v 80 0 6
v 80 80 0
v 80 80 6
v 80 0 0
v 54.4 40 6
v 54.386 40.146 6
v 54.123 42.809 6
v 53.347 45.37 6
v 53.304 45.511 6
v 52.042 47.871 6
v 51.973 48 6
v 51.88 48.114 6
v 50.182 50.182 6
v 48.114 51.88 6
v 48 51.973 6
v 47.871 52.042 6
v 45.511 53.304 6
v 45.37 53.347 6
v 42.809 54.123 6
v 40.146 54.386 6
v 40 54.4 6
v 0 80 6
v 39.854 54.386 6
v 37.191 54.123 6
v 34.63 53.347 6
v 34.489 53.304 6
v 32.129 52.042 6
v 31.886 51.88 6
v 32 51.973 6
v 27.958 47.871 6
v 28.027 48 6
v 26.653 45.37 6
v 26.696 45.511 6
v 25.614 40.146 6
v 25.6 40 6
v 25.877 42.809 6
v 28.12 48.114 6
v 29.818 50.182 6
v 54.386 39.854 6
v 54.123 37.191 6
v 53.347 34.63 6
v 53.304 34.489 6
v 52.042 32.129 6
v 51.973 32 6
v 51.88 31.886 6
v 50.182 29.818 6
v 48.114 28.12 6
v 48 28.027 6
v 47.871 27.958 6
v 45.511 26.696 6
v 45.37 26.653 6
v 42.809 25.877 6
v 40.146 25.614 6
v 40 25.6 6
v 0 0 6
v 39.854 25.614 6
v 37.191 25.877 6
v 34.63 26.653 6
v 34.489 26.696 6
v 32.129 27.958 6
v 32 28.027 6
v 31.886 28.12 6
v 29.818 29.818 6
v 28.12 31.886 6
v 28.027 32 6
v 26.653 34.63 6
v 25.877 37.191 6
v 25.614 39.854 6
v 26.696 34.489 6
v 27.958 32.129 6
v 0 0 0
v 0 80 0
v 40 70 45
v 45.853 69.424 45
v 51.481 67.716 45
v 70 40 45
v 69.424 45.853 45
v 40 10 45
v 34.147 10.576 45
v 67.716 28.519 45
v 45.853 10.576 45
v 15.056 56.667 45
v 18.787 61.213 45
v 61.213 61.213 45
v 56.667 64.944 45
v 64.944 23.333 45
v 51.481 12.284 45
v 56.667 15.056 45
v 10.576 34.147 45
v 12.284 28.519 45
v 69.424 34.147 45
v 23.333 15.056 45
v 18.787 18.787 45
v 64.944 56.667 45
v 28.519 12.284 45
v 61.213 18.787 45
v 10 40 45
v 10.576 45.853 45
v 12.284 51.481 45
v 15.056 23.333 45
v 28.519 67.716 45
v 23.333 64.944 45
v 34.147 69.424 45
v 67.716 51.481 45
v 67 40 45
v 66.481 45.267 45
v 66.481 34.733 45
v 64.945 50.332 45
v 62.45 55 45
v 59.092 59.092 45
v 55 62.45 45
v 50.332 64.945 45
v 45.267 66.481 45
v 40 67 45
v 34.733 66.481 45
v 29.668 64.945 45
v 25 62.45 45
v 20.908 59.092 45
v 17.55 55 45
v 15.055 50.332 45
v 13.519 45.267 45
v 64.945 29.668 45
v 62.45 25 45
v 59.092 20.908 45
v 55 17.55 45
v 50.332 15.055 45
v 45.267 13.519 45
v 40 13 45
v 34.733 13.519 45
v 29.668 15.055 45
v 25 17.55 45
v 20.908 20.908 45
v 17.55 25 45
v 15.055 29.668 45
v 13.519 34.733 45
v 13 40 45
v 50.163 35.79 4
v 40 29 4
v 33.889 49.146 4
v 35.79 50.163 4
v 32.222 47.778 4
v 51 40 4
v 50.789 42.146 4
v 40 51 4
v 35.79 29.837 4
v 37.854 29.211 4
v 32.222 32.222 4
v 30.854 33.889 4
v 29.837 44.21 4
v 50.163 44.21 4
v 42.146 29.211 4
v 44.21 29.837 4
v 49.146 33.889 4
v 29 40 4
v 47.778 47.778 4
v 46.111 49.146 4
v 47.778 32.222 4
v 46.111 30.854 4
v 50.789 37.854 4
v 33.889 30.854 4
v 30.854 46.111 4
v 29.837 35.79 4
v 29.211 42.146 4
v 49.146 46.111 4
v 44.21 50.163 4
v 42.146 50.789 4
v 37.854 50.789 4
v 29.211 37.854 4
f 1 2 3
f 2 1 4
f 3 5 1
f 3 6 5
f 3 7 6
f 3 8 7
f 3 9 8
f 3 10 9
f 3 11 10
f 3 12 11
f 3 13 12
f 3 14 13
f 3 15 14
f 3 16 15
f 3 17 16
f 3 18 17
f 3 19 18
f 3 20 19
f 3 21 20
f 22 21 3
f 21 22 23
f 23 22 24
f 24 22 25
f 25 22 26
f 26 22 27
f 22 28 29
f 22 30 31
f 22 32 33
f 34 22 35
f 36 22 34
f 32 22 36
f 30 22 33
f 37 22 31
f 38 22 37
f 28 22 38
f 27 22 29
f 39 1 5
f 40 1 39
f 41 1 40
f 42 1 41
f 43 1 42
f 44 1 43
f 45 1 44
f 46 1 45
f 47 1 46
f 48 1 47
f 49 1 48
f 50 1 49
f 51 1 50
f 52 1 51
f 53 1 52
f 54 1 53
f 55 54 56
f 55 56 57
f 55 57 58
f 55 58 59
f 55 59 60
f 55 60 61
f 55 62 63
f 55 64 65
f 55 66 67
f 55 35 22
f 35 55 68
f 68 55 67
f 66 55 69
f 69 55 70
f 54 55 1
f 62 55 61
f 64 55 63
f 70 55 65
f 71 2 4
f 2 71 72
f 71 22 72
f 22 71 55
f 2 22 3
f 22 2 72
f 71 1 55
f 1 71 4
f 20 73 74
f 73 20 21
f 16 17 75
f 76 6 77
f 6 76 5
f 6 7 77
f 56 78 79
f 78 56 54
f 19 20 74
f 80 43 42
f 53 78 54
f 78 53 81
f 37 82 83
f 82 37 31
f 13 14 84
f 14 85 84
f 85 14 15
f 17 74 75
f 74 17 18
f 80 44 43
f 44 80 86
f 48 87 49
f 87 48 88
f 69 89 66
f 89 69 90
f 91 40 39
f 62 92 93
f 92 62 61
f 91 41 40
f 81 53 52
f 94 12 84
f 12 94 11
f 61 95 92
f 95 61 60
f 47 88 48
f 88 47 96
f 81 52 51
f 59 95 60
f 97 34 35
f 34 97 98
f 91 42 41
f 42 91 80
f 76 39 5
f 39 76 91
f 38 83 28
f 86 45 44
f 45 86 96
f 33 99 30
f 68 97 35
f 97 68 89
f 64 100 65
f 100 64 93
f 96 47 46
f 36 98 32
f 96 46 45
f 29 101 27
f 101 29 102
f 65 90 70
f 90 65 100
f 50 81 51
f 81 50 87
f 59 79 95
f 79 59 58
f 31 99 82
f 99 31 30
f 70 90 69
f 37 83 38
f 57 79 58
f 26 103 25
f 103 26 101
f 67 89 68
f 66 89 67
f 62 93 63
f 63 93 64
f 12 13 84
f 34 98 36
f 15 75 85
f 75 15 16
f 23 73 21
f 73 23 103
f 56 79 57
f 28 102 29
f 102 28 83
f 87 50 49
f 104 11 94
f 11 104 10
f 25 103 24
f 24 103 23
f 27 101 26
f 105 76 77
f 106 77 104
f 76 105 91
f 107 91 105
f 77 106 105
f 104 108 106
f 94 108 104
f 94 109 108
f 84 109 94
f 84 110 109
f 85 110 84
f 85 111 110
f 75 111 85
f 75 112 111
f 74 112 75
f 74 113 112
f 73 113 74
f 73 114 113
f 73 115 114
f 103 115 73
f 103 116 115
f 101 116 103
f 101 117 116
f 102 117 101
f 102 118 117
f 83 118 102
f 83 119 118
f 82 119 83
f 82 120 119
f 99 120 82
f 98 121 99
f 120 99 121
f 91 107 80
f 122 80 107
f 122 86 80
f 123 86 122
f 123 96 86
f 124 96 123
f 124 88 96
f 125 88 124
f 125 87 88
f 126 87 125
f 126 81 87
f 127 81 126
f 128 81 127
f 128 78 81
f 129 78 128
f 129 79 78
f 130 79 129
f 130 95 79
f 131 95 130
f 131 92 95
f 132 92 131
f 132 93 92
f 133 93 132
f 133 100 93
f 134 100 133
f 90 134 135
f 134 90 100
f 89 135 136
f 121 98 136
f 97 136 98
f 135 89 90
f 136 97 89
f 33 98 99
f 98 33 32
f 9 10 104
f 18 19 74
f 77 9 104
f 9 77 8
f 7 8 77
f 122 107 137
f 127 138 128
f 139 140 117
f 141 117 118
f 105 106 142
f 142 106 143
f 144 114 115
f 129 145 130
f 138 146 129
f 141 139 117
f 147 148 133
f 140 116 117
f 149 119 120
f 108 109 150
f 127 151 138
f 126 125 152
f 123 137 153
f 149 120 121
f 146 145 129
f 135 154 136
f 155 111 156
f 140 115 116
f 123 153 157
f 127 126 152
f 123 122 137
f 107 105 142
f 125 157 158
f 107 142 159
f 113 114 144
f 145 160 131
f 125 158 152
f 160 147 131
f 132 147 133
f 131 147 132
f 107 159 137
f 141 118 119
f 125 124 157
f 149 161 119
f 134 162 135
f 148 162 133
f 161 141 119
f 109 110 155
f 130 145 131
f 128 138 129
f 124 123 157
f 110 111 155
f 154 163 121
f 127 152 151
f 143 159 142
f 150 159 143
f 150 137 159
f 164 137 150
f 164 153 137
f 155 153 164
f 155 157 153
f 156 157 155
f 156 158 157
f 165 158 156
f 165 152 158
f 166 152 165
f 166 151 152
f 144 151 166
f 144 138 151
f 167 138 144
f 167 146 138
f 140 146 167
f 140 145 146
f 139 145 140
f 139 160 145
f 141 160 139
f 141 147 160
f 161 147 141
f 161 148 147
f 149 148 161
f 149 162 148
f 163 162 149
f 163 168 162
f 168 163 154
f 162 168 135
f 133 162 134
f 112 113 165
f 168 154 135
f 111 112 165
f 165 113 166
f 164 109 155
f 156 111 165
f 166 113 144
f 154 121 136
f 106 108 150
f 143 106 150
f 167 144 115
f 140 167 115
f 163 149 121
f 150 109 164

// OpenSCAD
$fn = 32;

// ----------------------------------------------------------------------
// Hopper: funnel with square flange
// ----------------------------------------------------------------------

// --- parameters (mm) ---
fl = 80;                  // flange side, X and Y
fl_t = 6;                 // flange thickness
cone_h = 40;              // cone height above the flange
top_d = 60;               // cone mouth diameter
bot_d = 28;               // cone spout diameter
wall = 3;                 // cone wall thickness
fit_tol = 0.05;           // tolerance for press fits, mm
free_tol = 0.2;           // tolerance for clearance fits, mm

bore_d = bot_d - 2 * wall;  // spout bore diameter
total_h = fl_t + cone_h - 1;  // overall height

difference() {
  union() {
    cube([fl, fl, fl_t]);
    translate([fl / 2, fl / 2, fl_t - 1])
      cylinder(h = cone_h, d1 = bot_d, d2 = top_d);
  }
  translate([fl / 2, fl / 2, fl_t - 2])
    cylinder(h = cone_h + 1, d1 = bore_d, d2 = top_d - 2 * wall);
}
